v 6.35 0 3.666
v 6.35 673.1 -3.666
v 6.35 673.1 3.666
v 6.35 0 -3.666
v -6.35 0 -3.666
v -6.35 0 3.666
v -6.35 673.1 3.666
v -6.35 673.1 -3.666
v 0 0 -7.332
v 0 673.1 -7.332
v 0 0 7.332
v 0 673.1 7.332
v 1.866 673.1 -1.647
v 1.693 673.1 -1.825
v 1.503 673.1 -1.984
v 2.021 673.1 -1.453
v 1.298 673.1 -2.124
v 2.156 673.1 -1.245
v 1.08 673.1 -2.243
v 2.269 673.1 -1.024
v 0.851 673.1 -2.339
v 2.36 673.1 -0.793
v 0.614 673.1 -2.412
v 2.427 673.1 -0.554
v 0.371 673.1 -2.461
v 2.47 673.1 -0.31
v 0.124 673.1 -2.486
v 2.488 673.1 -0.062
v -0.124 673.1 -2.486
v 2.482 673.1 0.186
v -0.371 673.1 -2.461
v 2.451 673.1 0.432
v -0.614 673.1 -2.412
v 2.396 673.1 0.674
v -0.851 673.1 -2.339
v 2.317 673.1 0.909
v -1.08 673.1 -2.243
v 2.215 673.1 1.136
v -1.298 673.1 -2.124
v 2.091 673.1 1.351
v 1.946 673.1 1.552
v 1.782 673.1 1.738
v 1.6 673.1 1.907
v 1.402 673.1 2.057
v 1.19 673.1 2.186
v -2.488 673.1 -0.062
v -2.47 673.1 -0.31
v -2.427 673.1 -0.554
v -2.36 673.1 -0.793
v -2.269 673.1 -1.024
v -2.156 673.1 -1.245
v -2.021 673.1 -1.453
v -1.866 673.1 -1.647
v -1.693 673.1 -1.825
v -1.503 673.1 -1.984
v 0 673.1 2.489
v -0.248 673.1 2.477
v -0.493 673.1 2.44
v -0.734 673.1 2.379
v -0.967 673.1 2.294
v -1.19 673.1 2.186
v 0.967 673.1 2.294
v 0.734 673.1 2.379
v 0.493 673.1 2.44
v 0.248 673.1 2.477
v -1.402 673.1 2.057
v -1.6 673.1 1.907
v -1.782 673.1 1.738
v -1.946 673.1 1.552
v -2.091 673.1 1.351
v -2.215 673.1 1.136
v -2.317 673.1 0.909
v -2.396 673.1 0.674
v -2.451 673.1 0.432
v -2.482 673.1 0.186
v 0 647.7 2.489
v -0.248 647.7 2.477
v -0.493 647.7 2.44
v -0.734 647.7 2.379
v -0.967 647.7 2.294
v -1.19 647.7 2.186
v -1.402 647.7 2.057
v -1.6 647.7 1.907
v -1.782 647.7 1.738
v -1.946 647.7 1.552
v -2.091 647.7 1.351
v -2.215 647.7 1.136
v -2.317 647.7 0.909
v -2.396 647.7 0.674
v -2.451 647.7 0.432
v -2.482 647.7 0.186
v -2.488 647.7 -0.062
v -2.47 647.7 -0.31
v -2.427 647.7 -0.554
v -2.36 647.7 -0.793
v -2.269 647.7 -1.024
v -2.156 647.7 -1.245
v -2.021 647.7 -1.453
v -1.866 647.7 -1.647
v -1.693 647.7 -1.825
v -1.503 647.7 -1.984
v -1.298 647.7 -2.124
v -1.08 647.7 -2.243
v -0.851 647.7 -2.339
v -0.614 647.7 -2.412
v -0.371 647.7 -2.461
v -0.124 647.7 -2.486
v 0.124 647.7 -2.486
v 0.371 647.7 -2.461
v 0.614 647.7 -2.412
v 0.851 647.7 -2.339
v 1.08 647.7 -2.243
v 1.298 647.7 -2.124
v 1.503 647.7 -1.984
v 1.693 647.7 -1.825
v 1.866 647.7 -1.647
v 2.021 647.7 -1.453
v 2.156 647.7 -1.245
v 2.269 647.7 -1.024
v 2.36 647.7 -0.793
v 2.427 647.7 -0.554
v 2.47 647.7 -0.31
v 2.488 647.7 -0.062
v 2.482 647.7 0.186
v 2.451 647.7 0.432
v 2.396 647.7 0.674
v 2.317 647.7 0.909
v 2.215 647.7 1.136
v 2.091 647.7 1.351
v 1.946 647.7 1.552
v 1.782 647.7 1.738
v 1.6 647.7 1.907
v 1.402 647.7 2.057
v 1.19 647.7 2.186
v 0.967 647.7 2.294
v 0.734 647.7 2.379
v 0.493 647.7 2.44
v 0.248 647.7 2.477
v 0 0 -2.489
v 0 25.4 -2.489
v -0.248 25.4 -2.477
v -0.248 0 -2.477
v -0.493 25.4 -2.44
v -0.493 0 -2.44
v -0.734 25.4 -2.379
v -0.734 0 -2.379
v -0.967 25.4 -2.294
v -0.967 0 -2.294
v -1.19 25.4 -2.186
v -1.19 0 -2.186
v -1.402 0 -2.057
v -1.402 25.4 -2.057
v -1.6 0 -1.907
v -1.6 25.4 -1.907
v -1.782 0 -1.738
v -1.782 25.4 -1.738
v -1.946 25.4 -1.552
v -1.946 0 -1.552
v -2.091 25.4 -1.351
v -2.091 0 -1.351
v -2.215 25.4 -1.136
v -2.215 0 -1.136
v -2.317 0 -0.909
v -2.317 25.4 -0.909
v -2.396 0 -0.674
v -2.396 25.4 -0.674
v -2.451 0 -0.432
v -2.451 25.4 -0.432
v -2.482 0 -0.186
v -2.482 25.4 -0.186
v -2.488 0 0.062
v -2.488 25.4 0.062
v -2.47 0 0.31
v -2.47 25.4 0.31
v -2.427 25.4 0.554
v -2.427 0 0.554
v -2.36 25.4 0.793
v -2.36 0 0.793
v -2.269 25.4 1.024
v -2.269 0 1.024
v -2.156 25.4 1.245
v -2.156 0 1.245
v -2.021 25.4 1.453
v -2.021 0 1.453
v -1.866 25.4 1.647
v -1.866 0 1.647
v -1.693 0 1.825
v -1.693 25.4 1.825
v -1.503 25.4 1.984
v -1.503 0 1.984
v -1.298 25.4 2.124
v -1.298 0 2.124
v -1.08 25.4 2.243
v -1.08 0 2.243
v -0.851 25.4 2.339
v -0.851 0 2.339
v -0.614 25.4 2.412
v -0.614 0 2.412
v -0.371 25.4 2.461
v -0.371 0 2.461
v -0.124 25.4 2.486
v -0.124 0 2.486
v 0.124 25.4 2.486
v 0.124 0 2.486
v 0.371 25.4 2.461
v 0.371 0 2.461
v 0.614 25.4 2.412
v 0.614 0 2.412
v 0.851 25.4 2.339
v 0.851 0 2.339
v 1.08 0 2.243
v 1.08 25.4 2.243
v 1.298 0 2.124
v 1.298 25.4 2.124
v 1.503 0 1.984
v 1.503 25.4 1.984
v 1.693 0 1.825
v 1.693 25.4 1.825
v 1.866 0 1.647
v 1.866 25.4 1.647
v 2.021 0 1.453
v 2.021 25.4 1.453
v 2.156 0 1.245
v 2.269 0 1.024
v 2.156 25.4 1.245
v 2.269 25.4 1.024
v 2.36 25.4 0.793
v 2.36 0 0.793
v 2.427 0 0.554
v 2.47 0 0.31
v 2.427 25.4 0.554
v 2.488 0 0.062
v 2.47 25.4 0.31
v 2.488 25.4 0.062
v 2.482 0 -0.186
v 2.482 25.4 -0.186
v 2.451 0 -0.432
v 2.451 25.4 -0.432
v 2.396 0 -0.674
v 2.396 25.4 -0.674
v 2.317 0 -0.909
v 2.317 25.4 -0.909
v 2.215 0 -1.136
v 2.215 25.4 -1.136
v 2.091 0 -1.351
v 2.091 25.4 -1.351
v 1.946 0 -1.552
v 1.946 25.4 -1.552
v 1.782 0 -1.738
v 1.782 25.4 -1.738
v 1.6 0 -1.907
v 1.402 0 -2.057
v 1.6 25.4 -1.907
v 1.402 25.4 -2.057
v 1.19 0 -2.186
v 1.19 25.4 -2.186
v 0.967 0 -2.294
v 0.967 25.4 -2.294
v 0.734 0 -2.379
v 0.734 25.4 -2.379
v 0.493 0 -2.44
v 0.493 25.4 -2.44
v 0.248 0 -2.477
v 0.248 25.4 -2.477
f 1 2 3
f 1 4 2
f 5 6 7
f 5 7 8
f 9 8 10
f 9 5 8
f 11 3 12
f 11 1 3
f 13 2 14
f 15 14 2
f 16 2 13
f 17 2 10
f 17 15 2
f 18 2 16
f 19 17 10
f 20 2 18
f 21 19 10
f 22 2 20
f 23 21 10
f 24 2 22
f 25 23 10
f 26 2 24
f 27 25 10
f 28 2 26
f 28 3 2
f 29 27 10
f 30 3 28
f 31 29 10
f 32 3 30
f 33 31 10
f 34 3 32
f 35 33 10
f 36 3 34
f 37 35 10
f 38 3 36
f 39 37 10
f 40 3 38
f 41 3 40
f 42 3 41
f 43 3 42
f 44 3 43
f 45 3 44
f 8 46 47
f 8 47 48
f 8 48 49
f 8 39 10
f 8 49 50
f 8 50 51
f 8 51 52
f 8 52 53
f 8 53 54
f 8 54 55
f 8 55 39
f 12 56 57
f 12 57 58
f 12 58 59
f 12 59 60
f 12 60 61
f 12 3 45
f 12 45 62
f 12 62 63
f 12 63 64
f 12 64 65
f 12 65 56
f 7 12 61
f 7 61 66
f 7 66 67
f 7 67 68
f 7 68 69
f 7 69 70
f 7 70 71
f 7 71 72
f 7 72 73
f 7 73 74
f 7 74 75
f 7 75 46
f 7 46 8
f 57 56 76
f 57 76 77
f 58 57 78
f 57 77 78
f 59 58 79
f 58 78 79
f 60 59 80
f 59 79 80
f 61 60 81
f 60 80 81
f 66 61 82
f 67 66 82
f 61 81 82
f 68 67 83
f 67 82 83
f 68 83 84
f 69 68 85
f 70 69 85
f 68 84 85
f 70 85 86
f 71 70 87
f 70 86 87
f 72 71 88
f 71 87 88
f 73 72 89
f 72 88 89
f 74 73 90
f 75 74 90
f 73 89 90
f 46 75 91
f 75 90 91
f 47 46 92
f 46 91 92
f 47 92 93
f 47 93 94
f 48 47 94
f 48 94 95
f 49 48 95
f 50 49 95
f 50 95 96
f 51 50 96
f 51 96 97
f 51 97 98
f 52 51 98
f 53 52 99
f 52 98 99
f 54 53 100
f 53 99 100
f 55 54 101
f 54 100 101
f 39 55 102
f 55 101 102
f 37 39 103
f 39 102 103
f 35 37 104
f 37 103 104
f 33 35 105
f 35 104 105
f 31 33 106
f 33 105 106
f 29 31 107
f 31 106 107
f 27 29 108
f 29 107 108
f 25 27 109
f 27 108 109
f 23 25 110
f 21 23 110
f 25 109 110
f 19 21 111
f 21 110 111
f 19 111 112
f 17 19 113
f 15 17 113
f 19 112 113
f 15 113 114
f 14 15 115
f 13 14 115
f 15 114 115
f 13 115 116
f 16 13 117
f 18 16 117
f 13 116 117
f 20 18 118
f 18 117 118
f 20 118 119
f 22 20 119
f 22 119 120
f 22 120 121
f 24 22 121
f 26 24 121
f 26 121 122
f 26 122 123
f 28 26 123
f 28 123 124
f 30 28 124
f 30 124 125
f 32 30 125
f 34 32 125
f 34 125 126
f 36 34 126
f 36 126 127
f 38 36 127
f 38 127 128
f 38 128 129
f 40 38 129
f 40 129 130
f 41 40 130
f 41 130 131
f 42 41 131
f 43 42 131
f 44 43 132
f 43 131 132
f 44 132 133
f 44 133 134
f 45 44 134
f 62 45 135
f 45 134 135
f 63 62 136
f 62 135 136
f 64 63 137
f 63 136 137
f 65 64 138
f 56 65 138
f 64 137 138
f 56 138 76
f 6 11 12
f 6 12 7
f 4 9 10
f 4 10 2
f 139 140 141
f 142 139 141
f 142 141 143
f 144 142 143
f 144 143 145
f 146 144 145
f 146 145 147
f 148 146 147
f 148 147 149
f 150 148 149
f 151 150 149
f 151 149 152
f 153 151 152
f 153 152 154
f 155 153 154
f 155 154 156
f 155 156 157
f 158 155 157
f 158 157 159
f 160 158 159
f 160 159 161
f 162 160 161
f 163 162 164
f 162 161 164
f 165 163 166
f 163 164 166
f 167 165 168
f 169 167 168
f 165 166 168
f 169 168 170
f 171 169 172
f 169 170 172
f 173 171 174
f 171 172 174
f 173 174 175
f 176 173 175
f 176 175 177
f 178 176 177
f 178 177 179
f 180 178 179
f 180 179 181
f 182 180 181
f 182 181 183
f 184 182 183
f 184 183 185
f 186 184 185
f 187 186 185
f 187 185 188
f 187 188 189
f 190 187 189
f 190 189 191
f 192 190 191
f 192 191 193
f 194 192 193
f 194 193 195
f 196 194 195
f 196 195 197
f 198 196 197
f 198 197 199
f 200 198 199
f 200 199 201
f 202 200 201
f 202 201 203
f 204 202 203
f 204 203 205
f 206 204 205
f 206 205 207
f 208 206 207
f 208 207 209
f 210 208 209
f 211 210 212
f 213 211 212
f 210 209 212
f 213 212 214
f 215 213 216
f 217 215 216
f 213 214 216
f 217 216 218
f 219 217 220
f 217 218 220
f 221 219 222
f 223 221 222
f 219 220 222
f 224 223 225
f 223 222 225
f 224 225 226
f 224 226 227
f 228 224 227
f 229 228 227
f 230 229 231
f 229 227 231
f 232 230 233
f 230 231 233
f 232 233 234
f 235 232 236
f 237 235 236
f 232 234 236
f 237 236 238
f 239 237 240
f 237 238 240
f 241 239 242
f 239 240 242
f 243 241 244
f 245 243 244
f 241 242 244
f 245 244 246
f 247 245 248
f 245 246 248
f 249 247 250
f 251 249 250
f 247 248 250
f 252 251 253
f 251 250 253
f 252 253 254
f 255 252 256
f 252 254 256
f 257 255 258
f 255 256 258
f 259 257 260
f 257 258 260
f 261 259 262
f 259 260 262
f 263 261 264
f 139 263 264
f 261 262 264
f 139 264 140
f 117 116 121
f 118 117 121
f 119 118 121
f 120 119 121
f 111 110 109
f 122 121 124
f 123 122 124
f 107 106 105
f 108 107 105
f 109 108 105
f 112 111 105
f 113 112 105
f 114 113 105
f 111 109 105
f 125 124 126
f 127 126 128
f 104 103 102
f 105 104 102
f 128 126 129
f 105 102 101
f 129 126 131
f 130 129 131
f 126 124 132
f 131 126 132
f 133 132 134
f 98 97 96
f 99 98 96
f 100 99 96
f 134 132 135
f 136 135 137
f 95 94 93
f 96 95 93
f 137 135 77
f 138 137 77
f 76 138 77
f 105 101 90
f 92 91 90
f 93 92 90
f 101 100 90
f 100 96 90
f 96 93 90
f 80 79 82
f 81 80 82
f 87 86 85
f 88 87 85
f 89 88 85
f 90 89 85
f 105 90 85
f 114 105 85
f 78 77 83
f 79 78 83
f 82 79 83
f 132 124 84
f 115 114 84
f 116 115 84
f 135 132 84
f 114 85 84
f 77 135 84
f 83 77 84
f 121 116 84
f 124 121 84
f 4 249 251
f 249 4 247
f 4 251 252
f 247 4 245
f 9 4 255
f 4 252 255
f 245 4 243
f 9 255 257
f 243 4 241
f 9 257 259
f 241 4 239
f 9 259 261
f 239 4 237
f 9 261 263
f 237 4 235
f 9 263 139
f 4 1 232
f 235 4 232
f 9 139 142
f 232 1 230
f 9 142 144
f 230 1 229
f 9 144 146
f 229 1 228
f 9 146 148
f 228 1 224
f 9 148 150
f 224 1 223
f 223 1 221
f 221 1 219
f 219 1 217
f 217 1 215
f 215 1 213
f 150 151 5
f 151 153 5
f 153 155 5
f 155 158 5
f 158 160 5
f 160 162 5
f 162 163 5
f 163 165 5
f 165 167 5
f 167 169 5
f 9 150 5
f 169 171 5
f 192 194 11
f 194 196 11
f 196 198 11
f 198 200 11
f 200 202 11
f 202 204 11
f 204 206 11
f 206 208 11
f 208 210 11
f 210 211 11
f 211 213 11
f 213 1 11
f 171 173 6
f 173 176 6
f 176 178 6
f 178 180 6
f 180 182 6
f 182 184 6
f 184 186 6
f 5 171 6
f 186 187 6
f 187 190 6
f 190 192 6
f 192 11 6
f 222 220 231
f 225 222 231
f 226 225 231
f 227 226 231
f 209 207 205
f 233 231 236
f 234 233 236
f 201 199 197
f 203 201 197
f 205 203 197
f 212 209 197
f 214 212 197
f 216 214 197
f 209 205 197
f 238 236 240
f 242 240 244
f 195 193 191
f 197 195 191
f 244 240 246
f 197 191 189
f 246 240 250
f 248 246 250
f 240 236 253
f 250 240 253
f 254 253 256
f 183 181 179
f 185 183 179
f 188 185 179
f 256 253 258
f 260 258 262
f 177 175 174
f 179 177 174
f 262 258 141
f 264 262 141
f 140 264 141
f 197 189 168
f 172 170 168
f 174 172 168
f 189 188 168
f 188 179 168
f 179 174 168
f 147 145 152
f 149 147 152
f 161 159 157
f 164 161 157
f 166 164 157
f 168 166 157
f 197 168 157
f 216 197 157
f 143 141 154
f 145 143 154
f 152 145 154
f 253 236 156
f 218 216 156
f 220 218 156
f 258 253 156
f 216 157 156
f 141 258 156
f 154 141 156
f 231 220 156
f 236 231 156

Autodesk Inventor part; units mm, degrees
ref_plane "YZ Plane" through (0, 0, 0) normal (1, 0, 0) x (0, 1, 0)
ref_plane "XZ Plane" through (0, 0, 0) normal (0, 1, 0) x (-1, 0, 0)
ref_plane "XY Plane" through (0, 0, 0) normal (0, 0, 1) x (1, 0, 0)
sketch "Sketch1" plane through (0, 0, 0) normal (0, 1, 0) x (-1, 0, 0)
  line L0 (6.35, -3.6662) -> (0, -7.3323)
  line L1 (0, -7.3323) -> (-6.35, -3.6662)
  line L2 (-6.35, -3.6662) -> (-6.35, 3.6662)
  line L3 (-6.35, 3.6662) -> (0, 7.3323)
  line L4 (0, 7.3323) -> (6.35, 3.6662)
  line L5 (6.35, 3.6662) -> (6.35, -3.6662)
  point P0 (0, 0)
  point P1 (0, 0)
  point P2 (0, 0)
  dimension "d0" = 12.7
extrude "Extrusion1" add sketch "Sketch1" along normal blind 673.1
hole "Hole1" at (0, 0, 0) direction (0, 1, 0) diameter 4.9784 depth 25.4 thread size "1/4-20 UNC" class "2B" standard "ANSI Unified Screw Threads"
sketch "Sketch2" plane through (0, 673.1, 0) normal (0, 1, 0) x (1, 0, 0)
  point P0 (0, 0)
  point P1 (0, 0)
hole "Hole2" at (0, 673.1, 0) direction (0, -1, 0) diameter 4.9784 depth 25.4 thread size "1/4-20 UNC" class "2B" standard "ANSI Unified Screw Threads"
properties part number "Intake Roller Hex Shaft"
